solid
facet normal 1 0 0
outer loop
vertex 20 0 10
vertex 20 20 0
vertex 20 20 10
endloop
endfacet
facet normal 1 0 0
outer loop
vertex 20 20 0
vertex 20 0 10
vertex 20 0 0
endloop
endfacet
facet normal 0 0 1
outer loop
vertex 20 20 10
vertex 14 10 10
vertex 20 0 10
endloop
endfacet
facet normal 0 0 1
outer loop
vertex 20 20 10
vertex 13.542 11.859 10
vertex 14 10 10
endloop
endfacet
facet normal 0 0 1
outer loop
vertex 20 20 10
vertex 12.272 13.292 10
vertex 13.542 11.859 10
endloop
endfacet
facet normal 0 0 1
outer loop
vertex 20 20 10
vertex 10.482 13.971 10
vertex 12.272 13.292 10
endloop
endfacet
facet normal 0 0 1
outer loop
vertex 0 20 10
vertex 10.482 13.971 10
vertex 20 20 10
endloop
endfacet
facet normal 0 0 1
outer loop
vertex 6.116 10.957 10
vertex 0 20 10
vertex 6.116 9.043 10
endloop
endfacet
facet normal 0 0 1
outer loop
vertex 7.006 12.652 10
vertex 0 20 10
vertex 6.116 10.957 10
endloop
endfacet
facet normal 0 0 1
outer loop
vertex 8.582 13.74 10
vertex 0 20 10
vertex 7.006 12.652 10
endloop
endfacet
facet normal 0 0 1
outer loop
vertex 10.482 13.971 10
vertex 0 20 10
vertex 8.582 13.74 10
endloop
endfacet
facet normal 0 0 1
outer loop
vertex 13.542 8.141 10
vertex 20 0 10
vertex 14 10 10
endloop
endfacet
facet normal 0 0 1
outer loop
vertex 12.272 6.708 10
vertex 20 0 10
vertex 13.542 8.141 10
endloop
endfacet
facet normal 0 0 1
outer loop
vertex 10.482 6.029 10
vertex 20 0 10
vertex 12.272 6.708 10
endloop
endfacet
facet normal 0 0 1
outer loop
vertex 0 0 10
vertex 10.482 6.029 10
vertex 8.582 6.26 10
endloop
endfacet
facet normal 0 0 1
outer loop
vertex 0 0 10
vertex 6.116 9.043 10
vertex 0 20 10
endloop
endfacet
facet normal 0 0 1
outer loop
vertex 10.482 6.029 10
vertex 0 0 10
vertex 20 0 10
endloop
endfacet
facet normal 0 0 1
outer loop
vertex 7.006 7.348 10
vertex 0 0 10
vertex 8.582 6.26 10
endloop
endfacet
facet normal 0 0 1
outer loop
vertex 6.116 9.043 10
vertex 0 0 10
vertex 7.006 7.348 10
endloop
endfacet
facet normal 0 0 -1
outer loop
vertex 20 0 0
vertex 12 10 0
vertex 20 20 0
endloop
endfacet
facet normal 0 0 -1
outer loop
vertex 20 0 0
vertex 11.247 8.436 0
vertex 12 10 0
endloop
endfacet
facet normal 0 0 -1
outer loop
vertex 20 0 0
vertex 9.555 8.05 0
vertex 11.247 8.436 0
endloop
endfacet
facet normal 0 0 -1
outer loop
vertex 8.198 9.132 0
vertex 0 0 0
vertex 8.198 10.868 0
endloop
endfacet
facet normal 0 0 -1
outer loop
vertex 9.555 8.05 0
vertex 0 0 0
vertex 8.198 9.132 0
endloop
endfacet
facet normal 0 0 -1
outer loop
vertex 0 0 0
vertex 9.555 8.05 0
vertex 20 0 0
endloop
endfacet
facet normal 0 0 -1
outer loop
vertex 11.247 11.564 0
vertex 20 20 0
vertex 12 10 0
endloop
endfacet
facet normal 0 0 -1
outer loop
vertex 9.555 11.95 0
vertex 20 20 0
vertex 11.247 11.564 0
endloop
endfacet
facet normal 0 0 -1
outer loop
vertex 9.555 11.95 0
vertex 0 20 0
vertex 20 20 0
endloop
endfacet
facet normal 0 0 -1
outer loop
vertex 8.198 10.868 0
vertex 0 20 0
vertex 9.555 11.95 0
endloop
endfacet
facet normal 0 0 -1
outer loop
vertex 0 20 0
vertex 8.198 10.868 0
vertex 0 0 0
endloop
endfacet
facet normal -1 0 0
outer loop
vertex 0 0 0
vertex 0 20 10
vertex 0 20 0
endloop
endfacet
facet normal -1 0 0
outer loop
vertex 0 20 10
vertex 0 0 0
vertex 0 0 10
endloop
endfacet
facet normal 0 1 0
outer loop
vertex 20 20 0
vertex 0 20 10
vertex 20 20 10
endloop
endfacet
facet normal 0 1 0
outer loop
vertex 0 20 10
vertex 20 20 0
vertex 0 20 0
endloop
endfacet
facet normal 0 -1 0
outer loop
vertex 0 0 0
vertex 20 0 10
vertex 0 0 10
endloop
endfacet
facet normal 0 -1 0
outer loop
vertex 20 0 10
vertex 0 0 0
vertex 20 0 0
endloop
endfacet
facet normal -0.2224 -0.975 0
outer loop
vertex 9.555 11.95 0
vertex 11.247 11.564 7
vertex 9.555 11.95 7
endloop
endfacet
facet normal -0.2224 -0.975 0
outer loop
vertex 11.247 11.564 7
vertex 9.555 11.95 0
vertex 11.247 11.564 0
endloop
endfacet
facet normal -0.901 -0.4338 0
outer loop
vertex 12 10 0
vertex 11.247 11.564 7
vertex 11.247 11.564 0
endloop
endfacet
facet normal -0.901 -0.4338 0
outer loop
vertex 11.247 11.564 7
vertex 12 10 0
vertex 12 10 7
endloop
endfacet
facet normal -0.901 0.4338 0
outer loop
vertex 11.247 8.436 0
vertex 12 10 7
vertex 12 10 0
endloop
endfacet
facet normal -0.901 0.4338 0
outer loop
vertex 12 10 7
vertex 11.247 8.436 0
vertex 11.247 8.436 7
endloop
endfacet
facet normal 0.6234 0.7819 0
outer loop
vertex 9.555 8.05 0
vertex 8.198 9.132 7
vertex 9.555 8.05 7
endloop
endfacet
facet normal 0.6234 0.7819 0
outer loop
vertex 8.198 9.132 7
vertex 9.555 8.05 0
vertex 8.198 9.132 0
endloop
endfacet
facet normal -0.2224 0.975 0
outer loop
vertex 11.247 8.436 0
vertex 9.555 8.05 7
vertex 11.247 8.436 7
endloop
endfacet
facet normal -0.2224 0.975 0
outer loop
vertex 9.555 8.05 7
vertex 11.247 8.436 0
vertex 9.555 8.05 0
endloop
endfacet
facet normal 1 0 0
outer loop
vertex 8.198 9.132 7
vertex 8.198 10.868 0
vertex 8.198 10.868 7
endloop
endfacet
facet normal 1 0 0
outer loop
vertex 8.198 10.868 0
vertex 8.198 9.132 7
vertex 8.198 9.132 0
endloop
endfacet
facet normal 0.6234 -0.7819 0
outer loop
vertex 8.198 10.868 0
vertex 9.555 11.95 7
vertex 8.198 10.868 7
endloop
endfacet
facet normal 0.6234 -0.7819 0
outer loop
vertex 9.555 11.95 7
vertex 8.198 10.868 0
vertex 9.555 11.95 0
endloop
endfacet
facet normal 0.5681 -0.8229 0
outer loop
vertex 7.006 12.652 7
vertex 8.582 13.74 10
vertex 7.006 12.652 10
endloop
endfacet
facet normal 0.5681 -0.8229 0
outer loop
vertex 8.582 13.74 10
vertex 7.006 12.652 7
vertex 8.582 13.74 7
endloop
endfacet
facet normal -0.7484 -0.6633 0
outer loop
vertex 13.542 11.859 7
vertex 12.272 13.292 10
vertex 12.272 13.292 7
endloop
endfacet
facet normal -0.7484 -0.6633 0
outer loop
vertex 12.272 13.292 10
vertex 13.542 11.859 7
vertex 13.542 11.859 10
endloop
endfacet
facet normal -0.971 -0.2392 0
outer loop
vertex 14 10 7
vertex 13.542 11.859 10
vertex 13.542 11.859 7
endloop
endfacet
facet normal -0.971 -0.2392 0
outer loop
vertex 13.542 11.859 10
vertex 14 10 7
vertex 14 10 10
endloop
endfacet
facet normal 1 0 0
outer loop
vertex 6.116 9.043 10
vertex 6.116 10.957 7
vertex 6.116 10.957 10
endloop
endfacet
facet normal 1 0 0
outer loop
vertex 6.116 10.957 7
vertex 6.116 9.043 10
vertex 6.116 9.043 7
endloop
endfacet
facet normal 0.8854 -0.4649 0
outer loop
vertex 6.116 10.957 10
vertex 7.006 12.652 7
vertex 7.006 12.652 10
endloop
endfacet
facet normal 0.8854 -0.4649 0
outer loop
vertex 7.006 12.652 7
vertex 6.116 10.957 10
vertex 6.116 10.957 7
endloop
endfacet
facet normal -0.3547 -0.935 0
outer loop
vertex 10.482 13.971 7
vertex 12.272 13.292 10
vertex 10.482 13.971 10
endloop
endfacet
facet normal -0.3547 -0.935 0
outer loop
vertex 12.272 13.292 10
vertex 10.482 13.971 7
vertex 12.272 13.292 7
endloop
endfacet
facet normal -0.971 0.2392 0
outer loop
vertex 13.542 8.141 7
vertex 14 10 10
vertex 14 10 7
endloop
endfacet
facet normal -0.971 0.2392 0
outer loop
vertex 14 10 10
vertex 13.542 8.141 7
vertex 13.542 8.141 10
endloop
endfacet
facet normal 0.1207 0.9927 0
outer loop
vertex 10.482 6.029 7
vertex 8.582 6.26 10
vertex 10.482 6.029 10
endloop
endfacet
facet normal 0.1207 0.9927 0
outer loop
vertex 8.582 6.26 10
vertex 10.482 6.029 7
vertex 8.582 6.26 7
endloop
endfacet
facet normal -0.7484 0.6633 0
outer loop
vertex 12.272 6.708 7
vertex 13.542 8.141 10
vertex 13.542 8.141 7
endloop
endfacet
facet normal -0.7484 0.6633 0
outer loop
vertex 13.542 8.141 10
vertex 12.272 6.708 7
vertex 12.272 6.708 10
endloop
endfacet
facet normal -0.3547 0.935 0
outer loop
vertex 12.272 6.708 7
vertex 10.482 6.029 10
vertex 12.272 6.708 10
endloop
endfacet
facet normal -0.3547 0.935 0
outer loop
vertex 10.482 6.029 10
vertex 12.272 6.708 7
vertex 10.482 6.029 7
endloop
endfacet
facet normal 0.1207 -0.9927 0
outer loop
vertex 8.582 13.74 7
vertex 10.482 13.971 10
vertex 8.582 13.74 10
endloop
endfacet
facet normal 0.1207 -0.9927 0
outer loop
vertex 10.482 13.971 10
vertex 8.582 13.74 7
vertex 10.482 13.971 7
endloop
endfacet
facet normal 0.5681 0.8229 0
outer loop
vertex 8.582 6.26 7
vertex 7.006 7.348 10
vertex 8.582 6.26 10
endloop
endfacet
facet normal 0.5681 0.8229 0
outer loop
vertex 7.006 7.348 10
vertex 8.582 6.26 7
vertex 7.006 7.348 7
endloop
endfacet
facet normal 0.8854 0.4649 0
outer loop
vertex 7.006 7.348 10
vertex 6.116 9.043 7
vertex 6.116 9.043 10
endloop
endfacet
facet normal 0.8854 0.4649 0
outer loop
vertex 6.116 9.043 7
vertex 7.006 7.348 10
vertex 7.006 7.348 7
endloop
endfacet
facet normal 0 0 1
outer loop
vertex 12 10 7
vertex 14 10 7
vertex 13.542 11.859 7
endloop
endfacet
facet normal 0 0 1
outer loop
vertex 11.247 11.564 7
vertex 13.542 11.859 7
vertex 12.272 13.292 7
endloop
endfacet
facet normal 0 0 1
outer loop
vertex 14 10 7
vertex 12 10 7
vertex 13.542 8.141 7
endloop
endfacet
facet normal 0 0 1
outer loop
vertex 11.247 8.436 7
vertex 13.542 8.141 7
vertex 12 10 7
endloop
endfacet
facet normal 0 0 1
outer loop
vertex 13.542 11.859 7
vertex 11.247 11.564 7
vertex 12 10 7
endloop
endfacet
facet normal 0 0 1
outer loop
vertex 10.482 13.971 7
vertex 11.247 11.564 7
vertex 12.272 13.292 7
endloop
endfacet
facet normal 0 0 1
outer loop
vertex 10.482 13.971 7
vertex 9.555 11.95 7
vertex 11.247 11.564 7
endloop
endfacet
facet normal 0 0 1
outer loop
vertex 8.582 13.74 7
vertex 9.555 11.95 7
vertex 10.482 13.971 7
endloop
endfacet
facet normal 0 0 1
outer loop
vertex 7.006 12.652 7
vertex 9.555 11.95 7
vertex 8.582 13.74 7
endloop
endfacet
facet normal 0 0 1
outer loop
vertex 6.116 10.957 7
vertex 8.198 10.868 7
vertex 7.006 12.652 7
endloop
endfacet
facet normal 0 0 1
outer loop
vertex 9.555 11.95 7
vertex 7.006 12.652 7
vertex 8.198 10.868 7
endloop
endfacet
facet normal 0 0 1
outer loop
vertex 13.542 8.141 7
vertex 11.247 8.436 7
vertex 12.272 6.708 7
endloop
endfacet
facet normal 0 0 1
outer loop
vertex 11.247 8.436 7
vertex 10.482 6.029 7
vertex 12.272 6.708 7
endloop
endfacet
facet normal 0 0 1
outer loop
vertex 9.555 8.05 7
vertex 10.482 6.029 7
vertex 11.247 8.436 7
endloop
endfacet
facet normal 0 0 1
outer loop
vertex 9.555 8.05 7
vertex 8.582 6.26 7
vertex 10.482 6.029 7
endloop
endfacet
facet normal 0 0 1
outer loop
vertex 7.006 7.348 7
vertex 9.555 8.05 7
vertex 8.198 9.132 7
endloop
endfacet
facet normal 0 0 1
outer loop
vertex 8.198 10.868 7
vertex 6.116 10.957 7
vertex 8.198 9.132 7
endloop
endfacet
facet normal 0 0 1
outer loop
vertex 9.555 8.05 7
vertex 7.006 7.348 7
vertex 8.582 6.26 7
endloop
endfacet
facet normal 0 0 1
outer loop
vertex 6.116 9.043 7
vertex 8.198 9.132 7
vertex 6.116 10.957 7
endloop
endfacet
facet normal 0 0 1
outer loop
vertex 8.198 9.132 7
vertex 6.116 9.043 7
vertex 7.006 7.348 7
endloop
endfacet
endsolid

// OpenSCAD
// The exact-geometry audit's case x05 (docs/audits/exact-geometry-rust.md).
// volume: 3761.2389583271756
difference() { cube([20,20,10]); translate([10,10,-1]) cylinder(r=2, h=12); translate([10,10,7]) cylinder(r=4, h=3); }
